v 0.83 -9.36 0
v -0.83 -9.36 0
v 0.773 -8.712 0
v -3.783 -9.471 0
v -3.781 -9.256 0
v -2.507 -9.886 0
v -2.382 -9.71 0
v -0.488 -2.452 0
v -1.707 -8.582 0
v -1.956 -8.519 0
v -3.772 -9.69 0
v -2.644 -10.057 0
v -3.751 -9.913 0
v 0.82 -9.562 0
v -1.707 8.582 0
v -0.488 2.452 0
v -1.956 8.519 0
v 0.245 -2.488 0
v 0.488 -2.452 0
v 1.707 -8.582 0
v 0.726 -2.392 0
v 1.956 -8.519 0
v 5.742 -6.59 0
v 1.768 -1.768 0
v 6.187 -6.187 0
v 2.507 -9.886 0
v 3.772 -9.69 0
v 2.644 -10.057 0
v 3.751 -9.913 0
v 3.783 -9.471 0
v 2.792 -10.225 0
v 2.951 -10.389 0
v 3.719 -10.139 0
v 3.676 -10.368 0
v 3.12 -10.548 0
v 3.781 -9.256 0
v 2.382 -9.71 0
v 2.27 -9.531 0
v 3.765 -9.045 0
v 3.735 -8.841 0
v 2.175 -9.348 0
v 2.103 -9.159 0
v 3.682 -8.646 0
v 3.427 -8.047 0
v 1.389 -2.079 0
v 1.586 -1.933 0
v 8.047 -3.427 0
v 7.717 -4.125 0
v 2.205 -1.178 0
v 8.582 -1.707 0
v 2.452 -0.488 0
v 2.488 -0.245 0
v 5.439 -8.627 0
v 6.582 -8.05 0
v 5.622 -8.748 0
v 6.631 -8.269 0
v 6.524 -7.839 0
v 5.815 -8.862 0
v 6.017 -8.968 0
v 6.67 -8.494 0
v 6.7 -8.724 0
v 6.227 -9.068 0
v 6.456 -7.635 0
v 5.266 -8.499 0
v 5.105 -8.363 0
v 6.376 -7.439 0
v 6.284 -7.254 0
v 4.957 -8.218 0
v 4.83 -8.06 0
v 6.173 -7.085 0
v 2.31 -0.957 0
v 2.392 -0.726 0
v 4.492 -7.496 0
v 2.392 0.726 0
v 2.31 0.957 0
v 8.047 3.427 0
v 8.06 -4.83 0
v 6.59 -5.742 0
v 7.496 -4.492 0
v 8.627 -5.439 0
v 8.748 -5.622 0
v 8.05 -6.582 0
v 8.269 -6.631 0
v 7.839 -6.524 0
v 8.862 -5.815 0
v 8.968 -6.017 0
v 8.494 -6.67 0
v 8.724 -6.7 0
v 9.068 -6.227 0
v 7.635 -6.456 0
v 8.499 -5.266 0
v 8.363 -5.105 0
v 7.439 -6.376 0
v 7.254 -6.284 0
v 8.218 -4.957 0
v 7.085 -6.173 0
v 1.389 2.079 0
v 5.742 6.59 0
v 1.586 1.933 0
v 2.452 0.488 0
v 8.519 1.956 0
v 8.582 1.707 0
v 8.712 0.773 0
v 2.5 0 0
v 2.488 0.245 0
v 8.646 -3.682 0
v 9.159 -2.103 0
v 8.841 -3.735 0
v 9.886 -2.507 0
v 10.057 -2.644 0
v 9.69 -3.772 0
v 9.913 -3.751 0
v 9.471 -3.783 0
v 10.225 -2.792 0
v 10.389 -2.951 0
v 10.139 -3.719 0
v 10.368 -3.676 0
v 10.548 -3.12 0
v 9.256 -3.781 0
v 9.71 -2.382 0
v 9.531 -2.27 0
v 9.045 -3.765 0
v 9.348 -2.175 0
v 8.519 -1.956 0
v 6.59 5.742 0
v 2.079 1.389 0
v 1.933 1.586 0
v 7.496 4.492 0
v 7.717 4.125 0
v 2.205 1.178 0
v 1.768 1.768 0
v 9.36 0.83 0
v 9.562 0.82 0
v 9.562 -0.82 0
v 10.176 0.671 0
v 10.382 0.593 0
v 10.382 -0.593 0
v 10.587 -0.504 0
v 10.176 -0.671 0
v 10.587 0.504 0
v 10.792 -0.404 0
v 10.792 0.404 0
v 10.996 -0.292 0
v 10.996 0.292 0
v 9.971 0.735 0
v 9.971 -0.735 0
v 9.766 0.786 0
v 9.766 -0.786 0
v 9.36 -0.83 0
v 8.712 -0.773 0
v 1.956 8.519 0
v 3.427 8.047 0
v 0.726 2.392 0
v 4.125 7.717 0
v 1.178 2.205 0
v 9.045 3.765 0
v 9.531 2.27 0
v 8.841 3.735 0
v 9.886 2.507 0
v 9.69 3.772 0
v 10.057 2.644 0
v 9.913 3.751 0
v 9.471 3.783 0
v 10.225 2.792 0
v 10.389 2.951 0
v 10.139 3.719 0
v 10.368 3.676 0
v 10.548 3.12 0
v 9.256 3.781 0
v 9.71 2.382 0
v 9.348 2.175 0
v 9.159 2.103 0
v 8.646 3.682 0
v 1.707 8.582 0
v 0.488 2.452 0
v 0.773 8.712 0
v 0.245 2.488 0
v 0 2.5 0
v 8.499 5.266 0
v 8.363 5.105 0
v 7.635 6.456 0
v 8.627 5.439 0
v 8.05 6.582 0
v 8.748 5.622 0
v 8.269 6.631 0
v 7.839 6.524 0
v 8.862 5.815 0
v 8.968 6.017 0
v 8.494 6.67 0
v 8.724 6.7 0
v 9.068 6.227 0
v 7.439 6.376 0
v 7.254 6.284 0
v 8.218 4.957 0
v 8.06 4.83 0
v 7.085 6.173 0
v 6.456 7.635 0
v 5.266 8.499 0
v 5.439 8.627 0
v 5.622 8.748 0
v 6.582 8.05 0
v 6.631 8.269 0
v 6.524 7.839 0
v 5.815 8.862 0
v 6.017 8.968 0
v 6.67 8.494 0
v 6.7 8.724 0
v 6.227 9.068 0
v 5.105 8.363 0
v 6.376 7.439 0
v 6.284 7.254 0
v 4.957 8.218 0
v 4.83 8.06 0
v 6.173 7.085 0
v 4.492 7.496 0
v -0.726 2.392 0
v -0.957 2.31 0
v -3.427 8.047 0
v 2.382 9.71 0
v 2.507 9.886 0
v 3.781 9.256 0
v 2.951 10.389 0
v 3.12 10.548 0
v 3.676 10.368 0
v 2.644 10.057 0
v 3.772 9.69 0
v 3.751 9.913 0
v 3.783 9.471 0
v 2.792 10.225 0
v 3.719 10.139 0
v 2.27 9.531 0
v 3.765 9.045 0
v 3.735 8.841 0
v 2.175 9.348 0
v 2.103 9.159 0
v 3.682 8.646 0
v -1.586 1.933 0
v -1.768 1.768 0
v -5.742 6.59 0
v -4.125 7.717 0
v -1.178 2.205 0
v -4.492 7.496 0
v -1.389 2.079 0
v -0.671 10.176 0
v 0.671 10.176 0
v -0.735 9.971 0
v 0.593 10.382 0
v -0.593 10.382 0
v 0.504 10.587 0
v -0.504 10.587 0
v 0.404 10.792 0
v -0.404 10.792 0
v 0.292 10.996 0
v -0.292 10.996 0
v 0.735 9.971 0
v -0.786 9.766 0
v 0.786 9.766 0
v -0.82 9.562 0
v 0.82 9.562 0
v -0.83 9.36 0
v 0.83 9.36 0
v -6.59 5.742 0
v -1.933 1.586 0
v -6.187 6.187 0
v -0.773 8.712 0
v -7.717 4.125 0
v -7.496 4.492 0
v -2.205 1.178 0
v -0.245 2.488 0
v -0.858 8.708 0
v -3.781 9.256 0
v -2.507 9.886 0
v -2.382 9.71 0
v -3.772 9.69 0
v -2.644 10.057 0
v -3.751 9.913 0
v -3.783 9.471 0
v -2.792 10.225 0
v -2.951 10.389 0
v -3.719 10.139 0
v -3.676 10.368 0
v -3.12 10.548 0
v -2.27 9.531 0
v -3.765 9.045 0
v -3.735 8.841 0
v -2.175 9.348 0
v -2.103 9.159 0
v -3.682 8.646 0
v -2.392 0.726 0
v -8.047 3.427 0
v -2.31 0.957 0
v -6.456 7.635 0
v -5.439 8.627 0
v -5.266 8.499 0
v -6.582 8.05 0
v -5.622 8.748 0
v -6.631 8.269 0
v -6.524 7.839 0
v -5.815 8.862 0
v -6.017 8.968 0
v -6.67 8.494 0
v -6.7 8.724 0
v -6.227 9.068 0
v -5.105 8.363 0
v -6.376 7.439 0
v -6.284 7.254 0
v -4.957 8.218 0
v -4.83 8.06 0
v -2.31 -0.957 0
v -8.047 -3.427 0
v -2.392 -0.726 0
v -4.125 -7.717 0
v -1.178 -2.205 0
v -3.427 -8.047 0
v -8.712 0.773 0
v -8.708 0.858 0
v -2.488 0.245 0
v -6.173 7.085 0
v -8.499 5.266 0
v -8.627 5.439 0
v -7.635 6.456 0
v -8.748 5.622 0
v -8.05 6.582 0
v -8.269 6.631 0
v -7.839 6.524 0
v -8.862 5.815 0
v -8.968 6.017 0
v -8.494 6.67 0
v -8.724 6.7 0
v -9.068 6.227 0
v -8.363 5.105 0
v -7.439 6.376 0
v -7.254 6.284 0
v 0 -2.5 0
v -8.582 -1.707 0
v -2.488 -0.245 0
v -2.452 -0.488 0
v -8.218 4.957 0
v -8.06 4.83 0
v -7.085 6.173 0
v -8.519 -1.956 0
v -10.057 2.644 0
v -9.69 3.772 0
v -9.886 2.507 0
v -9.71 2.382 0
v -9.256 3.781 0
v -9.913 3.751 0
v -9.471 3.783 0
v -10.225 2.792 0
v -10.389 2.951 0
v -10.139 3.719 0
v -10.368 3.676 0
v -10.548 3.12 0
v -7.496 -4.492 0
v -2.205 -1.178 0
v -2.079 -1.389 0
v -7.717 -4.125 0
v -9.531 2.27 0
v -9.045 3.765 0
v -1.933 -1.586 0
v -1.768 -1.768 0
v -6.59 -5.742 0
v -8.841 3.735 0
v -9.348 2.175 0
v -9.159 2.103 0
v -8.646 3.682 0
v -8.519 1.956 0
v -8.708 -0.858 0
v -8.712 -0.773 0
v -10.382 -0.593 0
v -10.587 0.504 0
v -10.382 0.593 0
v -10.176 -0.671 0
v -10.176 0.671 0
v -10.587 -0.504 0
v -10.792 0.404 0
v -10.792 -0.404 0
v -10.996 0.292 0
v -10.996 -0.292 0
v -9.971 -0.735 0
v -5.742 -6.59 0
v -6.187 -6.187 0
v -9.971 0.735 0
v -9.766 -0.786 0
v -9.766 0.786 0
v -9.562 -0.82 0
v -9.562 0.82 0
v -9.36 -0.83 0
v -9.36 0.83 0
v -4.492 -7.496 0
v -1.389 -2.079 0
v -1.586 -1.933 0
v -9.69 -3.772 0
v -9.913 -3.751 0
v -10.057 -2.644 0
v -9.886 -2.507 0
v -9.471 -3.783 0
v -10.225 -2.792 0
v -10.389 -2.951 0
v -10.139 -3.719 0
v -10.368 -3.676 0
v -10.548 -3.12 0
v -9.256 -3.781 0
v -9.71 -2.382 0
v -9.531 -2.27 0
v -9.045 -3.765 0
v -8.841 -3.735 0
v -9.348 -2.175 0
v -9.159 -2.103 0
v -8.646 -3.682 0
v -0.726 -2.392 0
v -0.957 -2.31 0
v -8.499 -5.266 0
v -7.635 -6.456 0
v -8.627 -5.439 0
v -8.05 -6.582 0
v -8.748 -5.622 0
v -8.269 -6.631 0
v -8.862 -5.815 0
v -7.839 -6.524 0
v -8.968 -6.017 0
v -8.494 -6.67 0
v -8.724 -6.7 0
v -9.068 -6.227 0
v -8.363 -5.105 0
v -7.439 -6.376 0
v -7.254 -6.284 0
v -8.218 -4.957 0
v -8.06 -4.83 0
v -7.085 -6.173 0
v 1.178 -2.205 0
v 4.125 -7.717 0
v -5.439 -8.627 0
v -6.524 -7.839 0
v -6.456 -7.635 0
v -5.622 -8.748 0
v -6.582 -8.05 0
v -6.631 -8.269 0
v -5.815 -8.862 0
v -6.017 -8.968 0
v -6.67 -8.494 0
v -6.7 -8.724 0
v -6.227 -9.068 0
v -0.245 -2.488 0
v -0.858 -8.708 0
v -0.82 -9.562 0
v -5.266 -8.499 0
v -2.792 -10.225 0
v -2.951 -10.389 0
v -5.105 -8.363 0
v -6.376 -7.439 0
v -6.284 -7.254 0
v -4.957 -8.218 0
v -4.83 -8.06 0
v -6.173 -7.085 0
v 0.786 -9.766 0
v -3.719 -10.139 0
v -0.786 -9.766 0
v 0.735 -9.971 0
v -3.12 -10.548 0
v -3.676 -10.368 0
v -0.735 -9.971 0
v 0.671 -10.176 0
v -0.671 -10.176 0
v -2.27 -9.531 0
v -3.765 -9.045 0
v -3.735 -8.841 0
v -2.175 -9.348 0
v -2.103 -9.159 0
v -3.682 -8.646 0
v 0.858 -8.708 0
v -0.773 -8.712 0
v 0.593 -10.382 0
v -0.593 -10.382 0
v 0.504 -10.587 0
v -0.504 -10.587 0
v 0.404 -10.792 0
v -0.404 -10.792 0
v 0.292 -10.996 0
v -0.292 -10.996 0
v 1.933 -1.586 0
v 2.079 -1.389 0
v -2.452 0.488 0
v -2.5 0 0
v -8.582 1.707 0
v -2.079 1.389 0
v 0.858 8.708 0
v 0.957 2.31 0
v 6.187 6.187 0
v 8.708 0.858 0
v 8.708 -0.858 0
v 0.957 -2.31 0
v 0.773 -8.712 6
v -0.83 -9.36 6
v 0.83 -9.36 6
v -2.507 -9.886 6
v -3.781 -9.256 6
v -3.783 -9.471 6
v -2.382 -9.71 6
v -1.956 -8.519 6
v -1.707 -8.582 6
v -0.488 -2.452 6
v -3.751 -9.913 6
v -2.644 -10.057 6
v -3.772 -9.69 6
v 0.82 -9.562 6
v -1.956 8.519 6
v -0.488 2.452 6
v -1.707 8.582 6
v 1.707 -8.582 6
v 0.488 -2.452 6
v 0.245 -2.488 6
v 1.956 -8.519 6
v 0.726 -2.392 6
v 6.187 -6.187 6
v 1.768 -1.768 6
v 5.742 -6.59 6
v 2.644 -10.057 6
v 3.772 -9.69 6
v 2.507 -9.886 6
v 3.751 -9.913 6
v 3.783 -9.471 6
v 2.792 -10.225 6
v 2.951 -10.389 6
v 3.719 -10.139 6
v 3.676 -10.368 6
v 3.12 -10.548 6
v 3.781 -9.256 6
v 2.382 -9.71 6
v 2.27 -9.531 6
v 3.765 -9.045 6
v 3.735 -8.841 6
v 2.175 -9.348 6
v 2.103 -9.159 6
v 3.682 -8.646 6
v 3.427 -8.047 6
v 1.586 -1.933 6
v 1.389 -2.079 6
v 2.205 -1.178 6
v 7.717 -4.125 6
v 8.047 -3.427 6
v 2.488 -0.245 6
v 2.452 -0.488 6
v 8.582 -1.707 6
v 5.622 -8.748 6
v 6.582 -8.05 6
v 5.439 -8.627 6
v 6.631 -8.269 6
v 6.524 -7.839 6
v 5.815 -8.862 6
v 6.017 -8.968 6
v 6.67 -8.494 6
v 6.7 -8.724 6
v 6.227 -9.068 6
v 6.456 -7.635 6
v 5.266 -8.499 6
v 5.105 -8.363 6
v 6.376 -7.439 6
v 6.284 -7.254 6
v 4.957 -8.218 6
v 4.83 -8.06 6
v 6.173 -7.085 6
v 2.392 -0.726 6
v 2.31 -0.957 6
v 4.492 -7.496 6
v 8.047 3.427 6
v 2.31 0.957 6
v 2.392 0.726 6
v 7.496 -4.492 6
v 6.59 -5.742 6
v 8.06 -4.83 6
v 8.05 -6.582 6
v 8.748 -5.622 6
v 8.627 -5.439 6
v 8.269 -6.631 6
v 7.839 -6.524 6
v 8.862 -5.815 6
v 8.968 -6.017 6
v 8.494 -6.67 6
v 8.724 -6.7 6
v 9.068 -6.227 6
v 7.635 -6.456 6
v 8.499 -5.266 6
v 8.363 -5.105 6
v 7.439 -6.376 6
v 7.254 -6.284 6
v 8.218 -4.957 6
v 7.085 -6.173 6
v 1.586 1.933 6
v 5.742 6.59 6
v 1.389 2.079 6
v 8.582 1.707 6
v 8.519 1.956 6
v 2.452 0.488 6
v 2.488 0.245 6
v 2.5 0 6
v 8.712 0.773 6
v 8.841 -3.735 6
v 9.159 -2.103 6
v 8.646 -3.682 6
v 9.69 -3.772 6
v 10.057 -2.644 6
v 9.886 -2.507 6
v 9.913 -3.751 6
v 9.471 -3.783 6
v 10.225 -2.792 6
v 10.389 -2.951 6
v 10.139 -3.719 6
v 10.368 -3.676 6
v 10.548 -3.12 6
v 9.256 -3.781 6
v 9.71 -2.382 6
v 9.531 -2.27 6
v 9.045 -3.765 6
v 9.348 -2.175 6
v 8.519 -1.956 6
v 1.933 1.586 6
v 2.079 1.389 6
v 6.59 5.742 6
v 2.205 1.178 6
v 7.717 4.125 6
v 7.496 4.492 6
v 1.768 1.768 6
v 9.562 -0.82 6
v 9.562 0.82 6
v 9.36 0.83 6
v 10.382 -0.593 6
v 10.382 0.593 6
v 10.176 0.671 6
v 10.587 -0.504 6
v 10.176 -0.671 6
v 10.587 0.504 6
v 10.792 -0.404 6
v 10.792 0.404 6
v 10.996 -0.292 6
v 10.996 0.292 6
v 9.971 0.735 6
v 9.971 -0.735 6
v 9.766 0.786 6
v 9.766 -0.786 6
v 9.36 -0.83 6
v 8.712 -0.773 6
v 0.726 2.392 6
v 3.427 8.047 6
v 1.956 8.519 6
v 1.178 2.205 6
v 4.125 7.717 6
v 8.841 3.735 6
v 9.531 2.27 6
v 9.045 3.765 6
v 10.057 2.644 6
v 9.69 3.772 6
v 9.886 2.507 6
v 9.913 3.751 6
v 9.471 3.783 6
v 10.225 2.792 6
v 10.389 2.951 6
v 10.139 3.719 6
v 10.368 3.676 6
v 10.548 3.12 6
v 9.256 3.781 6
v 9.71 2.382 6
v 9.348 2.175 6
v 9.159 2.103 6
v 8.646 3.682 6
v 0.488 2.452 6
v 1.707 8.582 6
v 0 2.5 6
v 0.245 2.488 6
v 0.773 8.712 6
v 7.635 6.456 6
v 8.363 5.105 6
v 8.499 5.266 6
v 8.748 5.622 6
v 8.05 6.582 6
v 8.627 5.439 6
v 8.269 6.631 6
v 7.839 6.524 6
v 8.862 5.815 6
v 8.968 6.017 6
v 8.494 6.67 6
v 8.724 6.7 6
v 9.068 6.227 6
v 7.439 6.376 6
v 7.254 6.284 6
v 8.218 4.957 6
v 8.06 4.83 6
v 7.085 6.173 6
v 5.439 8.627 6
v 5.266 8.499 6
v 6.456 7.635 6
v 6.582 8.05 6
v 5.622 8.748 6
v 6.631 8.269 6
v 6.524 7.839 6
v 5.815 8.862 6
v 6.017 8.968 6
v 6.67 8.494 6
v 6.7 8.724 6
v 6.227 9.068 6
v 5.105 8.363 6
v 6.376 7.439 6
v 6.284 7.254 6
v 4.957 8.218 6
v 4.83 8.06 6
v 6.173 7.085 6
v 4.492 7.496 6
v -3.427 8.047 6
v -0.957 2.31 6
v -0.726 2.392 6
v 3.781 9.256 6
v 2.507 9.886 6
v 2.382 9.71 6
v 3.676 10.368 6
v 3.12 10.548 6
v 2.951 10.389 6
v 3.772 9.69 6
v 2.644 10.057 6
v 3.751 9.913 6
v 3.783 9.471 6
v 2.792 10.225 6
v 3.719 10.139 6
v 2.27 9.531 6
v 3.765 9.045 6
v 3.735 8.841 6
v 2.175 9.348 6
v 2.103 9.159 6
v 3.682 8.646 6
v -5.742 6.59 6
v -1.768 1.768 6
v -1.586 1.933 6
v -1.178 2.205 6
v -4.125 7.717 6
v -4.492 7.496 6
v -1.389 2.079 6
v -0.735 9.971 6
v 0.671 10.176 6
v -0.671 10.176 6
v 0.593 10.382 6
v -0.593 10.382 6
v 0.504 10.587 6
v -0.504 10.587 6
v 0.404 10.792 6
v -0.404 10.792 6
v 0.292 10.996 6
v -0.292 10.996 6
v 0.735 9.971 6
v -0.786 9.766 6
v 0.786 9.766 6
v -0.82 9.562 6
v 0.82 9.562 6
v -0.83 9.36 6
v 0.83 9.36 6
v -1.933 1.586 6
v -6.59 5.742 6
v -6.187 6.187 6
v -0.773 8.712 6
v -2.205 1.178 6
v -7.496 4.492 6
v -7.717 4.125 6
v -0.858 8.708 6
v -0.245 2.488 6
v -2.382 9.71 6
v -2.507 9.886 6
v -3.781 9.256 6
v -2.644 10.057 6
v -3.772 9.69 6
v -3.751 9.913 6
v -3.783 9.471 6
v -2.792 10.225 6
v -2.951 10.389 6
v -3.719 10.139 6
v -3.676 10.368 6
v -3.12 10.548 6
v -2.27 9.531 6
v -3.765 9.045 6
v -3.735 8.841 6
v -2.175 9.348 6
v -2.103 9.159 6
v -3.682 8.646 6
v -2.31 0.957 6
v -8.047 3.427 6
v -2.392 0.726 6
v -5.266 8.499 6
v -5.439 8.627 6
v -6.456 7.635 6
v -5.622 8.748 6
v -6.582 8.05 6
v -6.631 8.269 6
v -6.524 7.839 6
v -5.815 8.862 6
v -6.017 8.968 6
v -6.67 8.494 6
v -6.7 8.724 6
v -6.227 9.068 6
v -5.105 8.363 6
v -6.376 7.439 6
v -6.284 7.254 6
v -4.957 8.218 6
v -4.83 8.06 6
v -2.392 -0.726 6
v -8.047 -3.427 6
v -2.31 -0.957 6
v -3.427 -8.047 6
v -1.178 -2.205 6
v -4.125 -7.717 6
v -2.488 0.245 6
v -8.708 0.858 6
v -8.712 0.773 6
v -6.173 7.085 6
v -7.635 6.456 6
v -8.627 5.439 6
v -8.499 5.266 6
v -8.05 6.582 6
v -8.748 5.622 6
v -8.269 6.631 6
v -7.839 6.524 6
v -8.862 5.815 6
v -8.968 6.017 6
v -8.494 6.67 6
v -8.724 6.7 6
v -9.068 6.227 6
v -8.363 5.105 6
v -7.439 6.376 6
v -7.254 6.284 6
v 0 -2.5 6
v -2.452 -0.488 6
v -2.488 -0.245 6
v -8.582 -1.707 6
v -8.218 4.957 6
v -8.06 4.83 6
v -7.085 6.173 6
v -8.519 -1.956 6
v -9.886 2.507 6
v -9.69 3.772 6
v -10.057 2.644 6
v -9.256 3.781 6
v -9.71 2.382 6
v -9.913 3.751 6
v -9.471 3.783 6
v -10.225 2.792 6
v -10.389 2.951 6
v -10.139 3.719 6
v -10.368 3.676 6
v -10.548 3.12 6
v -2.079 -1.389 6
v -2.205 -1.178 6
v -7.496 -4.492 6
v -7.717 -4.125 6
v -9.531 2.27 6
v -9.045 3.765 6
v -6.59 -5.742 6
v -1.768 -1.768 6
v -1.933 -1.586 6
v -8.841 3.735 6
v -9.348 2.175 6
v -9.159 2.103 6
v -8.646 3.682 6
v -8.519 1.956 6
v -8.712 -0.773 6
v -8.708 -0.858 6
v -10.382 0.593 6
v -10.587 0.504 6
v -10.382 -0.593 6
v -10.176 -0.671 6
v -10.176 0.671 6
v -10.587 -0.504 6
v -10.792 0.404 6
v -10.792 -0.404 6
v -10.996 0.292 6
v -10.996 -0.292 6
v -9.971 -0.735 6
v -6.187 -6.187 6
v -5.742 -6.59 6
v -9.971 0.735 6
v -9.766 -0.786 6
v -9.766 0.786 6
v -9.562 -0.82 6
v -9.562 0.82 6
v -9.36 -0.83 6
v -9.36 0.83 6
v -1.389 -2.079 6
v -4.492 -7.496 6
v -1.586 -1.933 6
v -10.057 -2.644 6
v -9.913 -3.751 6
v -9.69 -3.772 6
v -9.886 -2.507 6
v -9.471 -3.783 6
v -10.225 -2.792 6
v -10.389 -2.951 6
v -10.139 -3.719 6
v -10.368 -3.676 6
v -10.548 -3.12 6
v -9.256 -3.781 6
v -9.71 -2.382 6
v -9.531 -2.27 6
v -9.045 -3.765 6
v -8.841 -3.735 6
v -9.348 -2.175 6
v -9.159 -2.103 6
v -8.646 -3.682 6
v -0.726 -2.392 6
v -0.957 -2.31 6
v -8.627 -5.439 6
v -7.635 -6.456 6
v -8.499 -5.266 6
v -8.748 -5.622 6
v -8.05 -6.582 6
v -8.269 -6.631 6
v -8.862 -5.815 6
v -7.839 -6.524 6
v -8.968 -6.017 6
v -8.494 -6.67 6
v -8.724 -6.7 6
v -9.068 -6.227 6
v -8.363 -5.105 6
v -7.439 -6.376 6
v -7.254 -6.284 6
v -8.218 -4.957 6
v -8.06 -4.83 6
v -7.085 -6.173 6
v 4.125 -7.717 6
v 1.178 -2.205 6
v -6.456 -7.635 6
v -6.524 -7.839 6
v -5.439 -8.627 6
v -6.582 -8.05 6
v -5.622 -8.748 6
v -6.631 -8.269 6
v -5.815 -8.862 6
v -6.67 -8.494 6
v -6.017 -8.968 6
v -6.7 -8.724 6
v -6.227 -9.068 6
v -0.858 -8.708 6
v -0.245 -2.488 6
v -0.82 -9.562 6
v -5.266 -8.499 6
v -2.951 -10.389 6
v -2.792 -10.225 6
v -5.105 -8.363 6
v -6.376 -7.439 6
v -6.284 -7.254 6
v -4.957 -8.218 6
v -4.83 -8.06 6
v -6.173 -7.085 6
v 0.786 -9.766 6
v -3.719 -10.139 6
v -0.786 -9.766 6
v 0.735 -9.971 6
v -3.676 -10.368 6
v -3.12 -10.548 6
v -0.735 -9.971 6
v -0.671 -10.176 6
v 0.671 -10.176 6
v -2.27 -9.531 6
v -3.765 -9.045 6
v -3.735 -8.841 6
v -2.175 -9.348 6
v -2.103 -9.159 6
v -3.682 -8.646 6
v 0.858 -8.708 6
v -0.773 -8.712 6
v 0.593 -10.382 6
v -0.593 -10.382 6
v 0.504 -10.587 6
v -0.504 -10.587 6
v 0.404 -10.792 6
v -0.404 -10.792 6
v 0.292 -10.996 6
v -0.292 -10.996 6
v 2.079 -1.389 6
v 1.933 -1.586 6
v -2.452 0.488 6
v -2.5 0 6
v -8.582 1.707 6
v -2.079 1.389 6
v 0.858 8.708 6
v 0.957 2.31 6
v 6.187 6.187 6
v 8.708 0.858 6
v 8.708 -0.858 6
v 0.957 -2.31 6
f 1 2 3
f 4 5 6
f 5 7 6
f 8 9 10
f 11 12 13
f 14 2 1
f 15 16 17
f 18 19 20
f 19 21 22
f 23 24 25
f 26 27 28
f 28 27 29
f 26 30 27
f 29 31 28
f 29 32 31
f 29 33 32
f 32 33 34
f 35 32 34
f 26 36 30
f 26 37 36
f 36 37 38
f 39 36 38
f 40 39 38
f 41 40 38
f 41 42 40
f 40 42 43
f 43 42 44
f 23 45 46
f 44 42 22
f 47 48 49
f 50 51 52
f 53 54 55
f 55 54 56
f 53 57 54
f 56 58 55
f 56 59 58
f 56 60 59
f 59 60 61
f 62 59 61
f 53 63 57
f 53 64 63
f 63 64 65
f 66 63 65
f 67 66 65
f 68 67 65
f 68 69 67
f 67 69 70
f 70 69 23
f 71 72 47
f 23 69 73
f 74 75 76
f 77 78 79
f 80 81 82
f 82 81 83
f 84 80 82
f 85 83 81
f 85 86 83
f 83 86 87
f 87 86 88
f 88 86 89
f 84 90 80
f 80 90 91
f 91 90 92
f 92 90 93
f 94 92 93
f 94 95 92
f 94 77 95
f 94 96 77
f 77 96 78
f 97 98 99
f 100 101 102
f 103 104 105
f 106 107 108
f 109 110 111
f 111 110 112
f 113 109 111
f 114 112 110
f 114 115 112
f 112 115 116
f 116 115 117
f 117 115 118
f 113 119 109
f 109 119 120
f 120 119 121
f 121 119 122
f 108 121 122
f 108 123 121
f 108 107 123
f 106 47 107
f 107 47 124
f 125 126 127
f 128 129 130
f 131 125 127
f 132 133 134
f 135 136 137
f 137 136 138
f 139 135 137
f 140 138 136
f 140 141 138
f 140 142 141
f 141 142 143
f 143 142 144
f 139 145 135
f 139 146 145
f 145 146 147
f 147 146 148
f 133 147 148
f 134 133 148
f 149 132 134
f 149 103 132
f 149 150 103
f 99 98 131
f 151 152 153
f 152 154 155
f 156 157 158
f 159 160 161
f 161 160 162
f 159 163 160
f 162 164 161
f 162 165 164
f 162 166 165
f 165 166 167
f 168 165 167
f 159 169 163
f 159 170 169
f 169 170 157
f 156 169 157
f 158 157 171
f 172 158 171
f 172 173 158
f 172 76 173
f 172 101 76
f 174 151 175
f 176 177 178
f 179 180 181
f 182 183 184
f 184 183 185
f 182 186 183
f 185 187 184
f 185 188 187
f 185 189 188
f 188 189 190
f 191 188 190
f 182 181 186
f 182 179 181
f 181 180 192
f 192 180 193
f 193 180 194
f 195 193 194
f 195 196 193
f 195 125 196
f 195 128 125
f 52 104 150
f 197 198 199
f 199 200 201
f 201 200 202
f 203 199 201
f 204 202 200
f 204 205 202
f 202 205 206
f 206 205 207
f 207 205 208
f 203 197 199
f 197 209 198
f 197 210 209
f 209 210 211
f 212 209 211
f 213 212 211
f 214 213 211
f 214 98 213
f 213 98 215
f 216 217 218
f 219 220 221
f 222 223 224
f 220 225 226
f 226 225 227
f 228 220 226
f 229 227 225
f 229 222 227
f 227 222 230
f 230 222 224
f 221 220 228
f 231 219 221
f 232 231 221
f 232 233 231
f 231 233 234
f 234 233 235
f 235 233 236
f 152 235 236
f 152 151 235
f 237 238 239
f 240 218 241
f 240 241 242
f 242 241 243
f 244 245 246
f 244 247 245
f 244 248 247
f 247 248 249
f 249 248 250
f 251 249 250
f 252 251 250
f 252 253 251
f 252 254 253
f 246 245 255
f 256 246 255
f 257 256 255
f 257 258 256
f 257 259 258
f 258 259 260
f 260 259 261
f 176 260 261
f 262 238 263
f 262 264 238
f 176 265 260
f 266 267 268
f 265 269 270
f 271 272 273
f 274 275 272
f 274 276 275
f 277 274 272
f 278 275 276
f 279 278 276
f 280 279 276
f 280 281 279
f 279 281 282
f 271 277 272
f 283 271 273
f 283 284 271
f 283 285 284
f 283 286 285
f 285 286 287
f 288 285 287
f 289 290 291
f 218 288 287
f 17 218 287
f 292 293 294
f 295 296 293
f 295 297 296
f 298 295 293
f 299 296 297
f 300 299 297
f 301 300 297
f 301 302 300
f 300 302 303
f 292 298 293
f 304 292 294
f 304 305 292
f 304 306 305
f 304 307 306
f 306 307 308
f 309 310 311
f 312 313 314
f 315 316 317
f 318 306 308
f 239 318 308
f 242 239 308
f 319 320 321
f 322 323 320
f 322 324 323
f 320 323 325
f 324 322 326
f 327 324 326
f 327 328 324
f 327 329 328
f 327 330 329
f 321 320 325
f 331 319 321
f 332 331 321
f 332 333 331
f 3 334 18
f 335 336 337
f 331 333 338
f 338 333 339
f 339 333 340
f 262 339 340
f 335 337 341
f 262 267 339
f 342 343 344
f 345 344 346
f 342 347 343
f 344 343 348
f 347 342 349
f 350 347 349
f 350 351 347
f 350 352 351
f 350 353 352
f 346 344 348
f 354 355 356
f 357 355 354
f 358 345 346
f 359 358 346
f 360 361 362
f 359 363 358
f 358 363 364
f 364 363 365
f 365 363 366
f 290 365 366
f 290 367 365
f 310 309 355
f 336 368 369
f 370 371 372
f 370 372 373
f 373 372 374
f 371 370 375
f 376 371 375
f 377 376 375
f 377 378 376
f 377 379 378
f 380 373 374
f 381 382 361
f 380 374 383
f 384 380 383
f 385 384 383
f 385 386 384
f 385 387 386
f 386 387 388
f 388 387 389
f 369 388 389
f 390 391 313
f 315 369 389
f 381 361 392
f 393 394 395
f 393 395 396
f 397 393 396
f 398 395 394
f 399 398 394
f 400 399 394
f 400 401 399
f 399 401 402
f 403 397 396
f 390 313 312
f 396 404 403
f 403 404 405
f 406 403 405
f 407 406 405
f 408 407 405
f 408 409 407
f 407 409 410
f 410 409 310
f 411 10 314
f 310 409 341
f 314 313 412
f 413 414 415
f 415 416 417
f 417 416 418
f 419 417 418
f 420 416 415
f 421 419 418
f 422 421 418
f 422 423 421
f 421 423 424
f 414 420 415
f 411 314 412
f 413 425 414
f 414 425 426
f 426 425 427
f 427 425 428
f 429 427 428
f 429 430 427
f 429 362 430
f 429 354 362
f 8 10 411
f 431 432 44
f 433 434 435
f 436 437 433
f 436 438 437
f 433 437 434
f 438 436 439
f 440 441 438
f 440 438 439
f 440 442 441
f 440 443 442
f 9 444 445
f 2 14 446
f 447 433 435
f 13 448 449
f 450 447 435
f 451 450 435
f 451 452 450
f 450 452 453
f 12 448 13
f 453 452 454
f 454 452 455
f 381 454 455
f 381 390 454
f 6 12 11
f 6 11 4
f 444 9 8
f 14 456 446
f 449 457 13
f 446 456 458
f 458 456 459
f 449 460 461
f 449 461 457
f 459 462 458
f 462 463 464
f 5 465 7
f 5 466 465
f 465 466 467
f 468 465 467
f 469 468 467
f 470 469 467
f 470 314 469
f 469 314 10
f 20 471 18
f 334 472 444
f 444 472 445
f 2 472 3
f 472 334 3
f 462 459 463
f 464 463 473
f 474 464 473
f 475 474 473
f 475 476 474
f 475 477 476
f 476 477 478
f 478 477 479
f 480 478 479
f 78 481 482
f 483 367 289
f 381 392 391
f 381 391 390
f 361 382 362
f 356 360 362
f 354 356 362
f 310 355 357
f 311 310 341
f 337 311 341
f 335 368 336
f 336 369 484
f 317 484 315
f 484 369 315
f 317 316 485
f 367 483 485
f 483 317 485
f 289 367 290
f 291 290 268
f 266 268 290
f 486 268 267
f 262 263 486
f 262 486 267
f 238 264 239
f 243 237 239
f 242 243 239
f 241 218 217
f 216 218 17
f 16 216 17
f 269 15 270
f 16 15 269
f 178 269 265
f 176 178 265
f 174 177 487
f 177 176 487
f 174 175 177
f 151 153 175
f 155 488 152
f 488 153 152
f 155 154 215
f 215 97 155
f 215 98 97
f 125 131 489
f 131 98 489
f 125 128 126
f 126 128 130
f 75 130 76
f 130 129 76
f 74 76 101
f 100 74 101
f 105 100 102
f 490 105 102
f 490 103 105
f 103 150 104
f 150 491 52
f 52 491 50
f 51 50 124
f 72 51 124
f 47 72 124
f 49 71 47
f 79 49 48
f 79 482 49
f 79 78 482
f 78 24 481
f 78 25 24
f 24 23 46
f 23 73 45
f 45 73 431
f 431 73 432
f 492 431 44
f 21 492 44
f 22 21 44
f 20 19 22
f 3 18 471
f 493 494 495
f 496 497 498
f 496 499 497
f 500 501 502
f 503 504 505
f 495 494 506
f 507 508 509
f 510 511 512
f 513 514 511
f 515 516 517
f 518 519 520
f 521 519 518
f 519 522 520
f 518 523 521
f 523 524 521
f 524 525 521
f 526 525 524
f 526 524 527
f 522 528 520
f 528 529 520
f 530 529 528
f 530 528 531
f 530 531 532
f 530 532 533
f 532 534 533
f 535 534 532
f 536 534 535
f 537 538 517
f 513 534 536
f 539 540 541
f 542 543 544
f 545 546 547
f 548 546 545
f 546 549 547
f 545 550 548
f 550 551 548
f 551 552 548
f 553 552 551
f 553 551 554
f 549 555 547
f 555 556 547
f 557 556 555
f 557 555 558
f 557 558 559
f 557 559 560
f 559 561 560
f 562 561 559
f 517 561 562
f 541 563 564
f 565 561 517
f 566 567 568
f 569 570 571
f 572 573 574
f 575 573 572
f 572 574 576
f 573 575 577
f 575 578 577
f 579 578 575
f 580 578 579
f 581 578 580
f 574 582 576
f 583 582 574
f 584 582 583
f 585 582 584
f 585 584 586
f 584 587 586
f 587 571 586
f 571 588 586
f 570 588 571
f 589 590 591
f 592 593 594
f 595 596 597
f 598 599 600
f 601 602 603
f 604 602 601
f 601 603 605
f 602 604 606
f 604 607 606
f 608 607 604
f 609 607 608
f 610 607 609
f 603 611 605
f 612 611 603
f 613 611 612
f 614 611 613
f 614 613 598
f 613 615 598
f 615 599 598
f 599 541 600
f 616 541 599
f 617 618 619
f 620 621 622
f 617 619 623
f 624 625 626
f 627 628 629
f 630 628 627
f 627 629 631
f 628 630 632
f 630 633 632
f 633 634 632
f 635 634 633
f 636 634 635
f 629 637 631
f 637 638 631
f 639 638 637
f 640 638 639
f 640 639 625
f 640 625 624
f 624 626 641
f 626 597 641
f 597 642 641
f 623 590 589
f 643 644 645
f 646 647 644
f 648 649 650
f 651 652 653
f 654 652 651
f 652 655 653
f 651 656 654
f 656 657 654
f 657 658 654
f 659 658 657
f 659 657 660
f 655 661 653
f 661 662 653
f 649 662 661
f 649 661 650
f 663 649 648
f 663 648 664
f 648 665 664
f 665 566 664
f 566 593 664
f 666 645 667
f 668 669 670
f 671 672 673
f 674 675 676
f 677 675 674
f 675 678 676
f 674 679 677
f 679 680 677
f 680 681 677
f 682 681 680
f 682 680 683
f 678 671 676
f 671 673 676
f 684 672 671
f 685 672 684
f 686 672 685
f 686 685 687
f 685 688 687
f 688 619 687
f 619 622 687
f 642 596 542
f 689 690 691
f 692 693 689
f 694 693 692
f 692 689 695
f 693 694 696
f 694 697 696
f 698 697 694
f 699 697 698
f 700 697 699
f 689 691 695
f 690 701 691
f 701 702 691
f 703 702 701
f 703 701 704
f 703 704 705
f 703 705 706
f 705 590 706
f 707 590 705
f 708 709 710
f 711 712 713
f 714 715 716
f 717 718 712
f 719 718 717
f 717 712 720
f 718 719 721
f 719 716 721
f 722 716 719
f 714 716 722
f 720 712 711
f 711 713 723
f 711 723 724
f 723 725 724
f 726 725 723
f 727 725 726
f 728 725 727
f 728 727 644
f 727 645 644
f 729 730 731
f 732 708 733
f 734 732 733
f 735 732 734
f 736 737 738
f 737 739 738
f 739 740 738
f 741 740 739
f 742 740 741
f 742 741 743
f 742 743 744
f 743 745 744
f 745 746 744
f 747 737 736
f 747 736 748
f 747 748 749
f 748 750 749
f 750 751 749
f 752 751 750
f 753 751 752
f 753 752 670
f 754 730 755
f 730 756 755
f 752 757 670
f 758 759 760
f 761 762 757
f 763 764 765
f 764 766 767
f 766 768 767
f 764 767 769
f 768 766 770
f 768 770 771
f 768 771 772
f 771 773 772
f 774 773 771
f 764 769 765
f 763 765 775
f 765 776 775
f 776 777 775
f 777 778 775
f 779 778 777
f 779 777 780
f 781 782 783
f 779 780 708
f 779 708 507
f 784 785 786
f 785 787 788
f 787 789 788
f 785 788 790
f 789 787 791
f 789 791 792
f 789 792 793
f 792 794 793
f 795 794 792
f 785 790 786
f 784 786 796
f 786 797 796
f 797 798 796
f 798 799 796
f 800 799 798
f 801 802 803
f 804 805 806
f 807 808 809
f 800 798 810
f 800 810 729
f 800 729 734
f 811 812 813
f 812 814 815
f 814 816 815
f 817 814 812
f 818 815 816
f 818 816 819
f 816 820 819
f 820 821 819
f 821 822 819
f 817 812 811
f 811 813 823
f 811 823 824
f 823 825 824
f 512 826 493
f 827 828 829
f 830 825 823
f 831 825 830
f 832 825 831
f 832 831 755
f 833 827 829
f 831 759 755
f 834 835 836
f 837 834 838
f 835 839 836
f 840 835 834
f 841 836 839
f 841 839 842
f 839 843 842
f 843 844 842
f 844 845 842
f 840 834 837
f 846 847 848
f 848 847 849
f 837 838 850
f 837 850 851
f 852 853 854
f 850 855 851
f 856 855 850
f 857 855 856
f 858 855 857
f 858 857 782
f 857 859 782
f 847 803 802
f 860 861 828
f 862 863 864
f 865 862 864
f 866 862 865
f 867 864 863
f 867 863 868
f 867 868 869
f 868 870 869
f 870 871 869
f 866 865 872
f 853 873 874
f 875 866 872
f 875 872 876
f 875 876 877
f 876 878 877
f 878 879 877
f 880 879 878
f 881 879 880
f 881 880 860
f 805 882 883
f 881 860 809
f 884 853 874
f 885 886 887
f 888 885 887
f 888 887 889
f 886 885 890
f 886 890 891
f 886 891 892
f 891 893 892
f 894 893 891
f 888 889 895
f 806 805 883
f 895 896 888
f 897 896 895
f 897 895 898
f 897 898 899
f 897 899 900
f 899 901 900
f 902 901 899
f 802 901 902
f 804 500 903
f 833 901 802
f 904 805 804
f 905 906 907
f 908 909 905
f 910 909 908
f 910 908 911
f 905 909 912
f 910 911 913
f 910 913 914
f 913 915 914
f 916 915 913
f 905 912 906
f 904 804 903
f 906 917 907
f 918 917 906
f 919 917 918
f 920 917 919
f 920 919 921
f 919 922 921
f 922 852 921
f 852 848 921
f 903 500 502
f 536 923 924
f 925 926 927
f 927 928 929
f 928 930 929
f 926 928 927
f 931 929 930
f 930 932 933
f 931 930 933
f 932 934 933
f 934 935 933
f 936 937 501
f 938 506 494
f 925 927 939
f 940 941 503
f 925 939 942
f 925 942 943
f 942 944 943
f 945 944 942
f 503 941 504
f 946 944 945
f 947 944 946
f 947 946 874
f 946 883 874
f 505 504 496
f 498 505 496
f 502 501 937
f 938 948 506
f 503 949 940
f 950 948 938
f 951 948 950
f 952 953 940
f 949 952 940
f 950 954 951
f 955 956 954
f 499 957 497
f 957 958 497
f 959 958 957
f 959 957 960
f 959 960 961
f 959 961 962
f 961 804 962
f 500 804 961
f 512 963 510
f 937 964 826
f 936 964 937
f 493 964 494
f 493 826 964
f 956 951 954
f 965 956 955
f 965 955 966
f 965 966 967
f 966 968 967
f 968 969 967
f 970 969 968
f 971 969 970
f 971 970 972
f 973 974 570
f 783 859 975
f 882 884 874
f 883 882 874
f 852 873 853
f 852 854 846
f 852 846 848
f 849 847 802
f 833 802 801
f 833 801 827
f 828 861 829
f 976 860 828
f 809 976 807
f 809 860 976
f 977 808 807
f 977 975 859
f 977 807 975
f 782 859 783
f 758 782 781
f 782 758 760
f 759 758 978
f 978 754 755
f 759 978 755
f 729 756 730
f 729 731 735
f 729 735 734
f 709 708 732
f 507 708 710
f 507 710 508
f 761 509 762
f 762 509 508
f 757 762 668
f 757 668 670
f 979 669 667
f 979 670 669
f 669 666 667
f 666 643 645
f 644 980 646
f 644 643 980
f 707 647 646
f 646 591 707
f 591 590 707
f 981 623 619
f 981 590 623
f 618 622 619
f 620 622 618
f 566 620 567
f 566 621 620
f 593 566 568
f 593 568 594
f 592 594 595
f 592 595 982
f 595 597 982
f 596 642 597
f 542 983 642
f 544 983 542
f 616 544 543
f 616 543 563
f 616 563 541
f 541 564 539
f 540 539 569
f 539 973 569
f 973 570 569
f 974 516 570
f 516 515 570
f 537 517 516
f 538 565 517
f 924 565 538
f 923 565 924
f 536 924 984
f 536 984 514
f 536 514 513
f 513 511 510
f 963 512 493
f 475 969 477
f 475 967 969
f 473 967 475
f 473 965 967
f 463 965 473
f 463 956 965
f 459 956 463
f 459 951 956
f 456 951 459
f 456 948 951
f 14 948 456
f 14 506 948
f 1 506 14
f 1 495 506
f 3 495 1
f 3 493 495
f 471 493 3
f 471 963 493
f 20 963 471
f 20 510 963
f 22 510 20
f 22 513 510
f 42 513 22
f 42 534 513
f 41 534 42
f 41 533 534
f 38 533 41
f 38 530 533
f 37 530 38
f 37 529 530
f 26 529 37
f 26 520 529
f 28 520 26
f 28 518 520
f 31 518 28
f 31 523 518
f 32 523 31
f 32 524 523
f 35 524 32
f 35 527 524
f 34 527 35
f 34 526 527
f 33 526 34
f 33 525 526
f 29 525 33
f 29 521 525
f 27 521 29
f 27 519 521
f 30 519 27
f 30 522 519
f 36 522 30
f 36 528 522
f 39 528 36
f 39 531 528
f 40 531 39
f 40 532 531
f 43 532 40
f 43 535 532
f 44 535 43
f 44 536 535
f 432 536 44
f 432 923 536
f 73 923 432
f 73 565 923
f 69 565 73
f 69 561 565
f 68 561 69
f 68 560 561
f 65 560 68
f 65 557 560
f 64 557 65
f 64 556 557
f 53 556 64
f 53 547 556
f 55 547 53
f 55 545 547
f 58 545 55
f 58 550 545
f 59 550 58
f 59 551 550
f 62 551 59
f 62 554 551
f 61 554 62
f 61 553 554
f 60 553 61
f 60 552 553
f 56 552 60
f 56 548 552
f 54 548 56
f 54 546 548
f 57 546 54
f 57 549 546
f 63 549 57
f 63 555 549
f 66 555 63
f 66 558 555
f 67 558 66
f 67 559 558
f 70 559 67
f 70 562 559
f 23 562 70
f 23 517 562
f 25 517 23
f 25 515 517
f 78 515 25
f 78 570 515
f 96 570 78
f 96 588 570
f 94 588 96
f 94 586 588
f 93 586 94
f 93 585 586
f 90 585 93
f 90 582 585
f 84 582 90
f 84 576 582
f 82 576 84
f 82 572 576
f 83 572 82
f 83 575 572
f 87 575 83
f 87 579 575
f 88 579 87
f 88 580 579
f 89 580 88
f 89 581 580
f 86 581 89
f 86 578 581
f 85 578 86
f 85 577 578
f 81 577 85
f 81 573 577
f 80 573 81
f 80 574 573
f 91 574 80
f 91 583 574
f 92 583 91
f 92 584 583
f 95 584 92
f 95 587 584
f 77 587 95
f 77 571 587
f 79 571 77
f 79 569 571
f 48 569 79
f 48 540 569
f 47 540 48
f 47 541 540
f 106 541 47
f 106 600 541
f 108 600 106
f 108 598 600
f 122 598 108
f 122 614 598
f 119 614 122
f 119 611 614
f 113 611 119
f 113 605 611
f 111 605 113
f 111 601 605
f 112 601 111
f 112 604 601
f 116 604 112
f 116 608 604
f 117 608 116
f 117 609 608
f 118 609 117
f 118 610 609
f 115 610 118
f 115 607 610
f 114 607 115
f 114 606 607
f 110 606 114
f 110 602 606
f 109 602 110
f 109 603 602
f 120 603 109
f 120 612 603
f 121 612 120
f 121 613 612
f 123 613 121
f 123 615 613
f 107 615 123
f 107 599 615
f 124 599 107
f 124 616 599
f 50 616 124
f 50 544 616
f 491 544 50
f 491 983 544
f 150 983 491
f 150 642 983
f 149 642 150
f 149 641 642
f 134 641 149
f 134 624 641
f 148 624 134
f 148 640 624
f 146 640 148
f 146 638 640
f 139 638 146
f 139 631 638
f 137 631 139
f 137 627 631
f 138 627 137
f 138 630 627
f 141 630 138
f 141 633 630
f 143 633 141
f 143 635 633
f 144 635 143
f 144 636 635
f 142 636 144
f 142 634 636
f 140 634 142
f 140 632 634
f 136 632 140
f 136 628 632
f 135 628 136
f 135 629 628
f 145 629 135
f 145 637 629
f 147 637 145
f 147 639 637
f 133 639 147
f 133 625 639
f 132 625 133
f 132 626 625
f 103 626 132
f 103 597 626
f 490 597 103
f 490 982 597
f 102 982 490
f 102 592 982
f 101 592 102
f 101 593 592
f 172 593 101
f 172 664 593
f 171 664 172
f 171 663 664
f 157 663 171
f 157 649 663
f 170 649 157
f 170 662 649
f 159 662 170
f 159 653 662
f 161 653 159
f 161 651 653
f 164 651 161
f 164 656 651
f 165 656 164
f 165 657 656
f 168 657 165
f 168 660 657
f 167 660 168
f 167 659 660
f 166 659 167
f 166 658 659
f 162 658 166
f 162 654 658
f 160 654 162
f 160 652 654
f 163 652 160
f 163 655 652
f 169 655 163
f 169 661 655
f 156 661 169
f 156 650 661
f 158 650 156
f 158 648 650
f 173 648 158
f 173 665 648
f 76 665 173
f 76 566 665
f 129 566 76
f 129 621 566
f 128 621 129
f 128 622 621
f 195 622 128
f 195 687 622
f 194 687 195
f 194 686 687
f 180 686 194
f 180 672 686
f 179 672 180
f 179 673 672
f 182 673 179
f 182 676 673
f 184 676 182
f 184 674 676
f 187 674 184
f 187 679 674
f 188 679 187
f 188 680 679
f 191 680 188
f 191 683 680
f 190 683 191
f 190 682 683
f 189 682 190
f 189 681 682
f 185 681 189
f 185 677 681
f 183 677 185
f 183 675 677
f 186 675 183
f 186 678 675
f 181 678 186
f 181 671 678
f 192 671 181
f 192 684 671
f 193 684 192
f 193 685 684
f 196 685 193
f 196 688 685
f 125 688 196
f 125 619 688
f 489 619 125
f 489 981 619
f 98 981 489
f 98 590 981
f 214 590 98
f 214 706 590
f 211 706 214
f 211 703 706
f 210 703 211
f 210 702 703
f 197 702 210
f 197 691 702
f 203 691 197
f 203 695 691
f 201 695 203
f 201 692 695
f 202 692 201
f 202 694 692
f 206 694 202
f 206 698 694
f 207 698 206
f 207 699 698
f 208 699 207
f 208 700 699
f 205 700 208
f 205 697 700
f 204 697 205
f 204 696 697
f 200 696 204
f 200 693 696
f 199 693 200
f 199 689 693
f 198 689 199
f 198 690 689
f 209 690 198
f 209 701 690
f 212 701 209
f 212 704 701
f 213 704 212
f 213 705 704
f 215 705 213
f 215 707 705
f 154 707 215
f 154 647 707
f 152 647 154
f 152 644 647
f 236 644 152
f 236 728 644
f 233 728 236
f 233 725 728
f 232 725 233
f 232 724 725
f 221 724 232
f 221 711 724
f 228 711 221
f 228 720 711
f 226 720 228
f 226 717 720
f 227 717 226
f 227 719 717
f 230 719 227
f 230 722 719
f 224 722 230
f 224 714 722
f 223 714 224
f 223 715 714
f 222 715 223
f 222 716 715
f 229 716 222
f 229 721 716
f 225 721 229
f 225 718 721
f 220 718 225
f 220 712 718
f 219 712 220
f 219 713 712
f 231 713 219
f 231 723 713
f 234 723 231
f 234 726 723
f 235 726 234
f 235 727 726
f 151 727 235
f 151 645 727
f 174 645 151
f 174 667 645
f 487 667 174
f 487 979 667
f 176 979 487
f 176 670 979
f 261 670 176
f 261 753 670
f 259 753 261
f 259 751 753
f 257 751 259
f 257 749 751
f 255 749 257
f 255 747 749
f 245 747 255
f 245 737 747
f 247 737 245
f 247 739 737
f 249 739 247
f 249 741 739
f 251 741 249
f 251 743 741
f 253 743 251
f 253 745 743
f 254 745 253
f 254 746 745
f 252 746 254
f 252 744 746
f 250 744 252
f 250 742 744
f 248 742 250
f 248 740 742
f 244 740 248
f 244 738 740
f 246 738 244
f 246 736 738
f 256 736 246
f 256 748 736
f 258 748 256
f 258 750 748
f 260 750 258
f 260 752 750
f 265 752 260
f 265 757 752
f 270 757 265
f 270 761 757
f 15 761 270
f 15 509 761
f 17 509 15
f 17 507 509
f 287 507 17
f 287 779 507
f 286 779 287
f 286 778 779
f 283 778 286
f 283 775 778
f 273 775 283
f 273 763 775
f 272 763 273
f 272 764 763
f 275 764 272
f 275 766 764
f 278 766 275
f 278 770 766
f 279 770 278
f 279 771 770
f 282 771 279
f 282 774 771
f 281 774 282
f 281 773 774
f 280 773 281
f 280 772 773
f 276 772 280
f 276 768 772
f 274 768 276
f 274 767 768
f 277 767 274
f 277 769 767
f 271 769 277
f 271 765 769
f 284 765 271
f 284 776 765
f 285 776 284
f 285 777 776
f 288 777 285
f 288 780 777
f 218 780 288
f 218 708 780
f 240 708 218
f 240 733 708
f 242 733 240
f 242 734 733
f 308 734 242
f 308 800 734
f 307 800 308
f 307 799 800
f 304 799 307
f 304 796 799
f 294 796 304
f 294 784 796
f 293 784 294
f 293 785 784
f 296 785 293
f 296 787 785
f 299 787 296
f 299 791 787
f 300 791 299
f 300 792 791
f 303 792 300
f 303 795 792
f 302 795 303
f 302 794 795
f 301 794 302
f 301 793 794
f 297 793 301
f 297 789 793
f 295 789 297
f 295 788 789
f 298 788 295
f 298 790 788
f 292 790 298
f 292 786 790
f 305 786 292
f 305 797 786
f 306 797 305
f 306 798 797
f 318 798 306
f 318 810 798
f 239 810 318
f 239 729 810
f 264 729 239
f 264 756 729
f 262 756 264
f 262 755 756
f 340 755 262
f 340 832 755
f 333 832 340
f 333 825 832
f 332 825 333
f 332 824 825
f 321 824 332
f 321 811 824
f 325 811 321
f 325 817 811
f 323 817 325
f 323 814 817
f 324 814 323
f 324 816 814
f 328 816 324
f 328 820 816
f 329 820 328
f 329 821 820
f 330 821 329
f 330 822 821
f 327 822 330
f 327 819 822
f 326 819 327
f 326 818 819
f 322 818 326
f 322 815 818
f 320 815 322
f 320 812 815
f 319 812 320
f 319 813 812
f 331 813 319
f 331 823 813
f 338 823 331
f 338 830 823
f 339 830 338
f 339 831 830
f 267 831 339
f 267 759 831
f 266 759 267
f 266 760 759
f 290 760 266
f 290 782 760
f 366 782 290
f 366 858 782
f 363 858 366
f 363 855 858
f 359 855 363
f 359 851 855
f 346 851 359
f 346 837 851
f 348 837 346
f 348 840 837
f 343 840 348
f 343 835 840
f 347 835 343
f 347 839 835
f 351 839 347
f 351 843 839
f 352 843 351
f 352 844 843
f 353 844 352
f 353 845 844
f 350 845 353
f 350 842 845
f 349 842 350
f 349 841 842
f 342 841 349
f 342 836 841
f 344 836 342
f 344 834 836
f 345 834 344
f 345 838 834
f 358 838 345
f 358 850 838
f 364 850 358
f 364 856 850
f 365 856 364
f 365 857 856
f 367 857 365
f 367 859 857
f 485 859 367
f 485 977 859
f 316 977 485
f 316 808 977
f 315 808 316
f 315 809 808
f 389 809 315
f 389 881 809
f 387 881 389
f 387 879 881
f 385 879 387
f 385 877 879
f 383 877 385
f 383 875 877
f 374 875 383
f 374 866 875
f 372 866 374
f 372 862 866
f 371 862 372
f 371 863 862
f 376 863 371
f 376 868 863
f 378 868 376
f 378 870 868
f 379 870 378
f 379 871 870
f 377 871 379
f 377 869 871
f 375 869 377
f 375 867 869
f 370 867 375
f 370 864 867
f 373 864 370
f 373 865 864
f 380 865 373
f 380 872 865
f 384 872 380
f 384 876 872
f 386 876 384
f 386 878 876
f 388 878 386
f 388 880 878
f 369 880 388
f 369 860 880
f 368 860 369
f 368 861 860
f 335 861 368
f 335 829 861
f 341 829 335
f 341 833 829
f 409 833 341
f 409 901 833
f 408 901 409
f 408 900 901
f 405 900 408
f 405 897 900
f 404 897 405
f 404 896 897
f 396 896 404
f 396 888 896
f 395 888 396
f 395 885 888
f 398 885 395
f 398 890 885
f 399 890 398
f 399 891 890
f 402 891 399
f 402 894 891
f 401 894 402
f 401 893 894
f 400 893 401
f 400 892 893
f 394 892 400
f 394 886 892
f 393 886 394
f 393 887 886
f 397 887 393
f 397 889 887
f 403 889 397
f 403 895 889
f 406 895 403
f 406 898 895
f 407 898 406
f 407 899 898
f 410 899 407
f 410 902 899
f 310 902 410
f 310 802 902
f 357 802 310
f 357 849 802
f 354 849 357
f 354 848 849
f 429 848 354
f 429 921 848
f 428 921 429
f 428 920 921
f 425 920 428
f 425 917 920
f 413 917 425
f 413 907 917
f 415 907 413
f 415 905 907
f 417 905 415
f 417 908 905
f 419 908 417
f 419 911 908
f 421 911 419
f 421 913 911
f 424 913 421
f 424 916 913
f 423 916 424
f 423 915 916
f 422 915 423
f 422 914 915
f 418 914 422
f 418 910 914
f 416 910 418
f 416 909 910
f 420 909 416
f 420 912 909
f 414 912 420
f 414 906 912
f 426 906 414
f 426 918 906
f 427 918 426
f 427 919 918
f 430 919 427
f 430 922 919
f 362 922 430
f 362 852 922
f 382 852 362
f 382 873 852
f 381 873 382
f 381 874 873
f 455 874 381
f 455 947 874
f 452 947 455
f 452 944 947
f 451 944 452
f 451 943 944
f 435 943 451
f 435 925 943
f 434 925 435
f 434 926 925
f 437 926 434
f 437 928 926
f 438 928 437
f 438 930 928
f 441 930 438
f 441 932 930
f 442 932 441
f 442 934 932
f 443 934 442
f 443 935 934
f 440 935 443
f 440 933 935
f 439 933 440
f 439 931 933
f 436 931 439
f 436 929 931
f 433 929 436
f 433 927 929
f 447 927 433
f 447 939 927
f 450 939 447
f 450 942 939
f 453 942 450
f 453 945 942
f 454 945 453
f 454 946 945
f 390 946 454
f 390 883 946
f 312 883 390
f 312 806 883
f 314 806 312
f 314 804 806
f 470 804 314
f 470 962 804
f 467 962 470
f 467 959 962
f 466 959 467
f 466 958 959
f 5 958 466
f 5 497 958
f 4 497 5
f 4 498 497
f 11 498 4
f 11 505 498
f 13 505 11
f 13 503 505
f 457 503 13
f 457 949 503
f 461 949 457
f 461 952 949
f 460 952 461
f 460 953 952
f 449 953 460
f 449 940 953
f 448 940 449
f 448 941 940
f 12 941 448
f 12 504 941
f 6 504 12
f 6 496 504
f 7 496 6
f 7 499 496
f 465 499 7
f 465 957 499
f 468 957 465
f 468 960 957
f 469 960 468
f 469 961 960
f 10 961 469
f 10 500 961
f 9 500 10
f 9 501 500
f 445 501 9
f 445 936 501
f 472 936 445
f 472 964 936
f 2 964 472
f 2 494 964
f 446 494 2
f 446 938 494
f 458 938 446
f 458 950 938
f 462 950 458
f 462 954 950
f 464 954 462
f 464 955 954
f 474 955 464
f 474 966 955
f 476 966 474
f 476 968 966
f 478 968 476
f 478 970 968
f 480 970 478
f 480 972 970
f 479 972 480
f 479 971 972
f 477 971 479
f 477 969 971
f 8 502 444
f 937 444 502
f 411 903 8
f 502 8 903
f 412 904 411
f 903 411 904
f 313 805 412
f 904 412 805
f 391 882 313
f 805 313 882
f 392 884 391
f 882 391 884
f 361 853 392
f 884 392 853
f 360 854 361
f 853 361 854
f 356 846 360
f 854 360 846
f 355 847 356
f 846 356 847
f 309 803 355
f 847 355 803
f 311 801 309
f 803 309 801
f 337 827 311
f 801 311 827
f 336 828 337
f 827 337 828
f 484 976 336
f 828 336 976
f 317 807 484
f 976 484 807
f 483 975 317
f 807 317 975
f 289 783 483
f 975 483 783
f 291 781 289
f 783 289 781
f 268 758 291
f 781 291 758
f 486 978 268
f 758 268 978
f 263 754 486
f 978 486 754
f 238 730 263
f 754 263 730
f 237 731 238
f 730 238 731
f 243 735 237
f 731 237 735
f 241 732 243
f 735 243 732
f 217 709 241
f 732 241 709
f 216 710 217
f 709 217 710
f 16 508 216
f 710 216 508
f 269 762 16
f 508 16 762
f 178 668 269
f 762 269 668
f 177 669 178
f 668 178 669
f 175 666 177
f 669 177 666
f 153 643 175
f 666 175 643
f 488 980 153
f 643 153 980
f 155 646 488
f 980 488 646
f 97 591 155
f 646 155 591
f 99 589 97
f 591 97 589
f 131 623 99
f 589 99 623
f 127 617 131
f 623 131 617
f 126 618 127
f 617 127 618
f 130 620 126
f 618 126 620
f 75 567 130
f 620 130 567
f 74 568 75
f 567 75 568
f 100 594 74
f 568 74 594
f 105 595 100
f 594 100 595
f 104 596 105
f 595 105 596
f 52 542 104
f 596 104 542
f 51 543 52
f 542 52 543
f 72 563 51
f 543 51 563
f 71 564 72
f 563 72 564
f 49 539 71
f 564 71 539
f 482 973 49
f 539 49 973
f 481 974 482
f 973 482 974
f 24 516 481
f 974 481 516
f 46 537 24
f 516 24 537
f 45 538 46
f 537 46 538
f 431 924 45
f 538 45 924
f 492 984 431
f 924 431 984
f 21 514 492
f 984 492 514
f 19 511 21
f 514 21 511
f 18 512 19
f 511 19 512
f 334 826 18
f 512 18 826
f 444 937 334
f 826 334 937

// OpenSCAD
// Spur gear
// An involute spur gear with a round bore.

/* [Gear] */
// Number of teeth
teeth = 20; // [8:1:80]
// Gear module: pitch diameter divided by teeth (mm)
gear_module = 1; // [0.5:0.25:4]
// Pressure angle (degrees)
pressure_angle = 20; // [14.5, 20, 25]
// Thickness (mm)
thickness = 6; // [2:0.5:30]

/* [Fit] */
// Bore diameter (mm)
bore = 5; // [0:0.5:30]
// Backlash per tooth (mm)
backlash = 0.1; // [0:0.05:0.5]

/* [Hidden] */
steps = 8;
$fn = 64;

pitch_r = teeth * gear_module / 2;
base_r = pitch_r * cos(pressure_angle);
outer_r = pitch_r + gear_module;
root_r = pitch_r - 1.25 * gear_module;
start_r = max(base_r, root_r);
half_tooth = ((PI * gear_module / 2 - backlash) / 2) / pitch_r * 180 / PI;

// Involute function, angle in degrees, result in radians.
function inv(a) = tan(a) - a * PI / 180;
// Half-width angle of the tooth (degrees) at radius r.
function flank(r) = max(half_tooth + (inv(pressure_angle) - inv(acos(min(1, base_r / r)))) * 180 / PI, 0.2);
function polar(r, a) = [r * cos(a), r * sin(a)];

module tooth() {
  rise = [for (i = [0:steps]) start_r + (outer_r - start_r) * i / steps];
  polygon(concat(
    [[0, 0]],
    [for (r = rise) polar(r, -flank(r))],
    [for (i = [steps:-1:0]) polar(rise[i], flank(rise[i]))]
  ));
}

module gear_2d() {
  difference() {
    union() {
      circle(r = root_r);
      for (i = [0:teeth - 1]) rotate(i * 360 / teeth) tooth();
    }
    if (bore > 0) circle(d = min(bore, 2 * root_r - 2 * gear_module));
  }
}

linear_extrude(height = thickness) gear_2d();
